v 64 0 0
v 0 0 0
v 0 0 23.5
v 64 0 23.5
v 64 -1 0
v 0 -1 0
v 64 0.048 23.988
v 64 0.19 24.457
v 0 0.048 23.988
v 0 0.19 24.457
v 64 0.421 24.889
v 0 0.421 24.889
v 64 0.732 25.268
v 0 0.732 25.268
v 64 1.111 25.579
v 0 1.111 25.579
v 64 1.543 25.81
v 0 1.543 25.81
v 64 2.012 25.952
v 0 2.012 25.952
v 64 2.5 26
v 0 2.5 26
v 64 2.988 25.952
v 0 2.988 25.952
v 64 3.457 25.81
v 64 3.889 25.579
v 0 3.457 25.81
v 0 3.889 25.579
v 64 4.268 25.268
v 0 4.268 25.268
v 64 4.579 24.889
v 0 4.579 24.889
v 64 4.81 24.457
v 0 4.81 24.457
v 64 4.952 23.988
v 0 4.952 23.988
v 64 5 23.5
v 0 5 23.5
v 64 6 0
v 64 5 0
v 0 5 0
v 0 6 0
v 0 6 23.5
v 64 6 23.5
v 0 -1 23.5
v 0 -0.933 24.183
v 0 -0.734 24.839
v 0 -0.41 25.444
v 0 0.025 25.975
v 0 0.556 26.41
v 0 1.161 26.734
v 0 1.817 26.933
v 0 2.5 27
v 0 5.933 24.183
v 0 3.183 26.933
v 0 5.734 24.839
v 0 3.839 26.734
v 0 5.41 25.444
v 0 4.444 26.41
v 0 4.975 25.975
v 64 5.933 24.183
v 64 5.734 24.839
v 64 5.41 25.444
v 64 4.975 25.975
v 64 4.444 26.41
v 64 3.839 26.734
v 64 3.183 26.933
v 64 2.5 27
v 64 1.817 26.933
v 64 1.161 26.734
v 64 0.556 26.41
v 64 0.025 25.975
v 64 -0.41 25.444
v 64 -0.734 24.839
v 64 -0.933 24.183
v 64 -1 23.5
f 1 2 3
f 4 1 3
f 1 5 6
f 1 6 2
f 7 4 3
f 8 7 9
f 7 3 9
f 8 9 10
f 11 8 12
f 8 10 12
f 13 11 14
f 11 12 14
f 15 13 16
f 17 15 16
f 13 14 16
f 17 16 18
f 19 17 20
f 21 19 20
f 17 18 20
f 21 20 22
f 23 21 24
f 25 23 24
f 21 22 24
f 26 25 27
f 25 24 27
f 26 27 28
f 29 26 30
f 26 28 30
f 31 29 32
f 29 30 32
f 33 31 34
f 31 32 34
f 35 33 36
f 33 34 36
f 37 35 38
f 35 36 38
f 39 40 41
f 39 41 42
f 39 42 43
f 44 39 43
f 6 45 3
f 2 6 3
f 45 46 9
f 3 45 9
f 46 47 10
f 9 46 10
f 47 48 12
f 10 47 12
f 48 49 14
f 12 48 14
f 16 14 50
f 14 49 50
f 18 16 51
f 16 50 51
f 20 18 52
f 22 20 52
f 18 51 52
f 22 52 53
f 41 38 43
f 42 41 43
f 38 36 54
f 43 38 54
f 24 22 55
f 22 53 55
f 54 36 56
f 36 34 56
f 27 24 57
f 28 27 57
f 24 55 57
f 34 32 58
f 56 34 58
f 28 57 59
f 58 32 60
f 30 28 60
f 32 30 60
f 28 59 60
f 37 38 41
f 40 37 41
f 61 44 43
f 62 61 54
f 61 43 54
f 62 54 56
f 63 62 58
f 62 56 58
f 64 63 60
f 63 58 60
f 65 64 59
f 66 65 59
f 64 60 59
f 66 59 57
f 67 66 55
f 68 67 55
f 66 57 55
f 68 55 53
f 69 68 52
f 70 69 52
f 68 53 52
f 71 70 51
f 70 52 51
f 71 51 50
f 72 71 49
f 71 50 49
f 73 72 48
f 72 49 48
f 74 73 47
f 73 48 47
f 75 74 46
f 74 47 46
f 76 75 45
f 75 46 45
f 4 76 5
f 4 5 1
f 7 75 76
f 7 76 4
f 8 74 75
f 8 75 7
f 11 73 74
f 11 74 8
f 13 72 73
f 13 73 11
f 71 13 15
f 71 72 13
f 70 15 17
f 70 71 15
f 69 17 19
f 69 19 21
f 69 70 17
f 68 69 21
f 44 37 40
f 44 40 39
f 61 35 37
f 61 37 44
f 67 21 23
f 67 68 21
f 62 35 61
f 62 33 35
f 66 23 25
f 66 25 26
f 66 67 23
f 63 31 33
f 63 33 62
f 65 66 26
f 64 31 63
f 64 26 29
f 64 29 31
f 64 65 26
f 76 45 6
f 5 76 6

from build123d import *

# Parameters (mm, degrees)
TABAN_FLAN_1_DEPTH = 64


# Sheet-metal steps are written as plain solids
with BuildPart() as part:
    # Çizim1 → Taban-Flanş1 (new body)
    with BuildSketch(Plane.YZ):
        with BuildLine():
            Line((0, 0), (0, 23.5))
            ThreePointArc((0, 23.5), (2.5, 26), (5, 23.5))
            Line((5, 23.5), (5, 0))
            Line((5, 0), (6, 0))
            Line((6, 0), (6, 23.5))
            ThreePointArc((6, 23.5), (2.5, 27), (-1, 23.5))
            Line((-1, 23.5), (-1, 0))
            Line((-1, 0), (0, 0))
        make_face()
    extrude(amount=TABAN_FLAN_1_DEPTH)


solid = part.part
